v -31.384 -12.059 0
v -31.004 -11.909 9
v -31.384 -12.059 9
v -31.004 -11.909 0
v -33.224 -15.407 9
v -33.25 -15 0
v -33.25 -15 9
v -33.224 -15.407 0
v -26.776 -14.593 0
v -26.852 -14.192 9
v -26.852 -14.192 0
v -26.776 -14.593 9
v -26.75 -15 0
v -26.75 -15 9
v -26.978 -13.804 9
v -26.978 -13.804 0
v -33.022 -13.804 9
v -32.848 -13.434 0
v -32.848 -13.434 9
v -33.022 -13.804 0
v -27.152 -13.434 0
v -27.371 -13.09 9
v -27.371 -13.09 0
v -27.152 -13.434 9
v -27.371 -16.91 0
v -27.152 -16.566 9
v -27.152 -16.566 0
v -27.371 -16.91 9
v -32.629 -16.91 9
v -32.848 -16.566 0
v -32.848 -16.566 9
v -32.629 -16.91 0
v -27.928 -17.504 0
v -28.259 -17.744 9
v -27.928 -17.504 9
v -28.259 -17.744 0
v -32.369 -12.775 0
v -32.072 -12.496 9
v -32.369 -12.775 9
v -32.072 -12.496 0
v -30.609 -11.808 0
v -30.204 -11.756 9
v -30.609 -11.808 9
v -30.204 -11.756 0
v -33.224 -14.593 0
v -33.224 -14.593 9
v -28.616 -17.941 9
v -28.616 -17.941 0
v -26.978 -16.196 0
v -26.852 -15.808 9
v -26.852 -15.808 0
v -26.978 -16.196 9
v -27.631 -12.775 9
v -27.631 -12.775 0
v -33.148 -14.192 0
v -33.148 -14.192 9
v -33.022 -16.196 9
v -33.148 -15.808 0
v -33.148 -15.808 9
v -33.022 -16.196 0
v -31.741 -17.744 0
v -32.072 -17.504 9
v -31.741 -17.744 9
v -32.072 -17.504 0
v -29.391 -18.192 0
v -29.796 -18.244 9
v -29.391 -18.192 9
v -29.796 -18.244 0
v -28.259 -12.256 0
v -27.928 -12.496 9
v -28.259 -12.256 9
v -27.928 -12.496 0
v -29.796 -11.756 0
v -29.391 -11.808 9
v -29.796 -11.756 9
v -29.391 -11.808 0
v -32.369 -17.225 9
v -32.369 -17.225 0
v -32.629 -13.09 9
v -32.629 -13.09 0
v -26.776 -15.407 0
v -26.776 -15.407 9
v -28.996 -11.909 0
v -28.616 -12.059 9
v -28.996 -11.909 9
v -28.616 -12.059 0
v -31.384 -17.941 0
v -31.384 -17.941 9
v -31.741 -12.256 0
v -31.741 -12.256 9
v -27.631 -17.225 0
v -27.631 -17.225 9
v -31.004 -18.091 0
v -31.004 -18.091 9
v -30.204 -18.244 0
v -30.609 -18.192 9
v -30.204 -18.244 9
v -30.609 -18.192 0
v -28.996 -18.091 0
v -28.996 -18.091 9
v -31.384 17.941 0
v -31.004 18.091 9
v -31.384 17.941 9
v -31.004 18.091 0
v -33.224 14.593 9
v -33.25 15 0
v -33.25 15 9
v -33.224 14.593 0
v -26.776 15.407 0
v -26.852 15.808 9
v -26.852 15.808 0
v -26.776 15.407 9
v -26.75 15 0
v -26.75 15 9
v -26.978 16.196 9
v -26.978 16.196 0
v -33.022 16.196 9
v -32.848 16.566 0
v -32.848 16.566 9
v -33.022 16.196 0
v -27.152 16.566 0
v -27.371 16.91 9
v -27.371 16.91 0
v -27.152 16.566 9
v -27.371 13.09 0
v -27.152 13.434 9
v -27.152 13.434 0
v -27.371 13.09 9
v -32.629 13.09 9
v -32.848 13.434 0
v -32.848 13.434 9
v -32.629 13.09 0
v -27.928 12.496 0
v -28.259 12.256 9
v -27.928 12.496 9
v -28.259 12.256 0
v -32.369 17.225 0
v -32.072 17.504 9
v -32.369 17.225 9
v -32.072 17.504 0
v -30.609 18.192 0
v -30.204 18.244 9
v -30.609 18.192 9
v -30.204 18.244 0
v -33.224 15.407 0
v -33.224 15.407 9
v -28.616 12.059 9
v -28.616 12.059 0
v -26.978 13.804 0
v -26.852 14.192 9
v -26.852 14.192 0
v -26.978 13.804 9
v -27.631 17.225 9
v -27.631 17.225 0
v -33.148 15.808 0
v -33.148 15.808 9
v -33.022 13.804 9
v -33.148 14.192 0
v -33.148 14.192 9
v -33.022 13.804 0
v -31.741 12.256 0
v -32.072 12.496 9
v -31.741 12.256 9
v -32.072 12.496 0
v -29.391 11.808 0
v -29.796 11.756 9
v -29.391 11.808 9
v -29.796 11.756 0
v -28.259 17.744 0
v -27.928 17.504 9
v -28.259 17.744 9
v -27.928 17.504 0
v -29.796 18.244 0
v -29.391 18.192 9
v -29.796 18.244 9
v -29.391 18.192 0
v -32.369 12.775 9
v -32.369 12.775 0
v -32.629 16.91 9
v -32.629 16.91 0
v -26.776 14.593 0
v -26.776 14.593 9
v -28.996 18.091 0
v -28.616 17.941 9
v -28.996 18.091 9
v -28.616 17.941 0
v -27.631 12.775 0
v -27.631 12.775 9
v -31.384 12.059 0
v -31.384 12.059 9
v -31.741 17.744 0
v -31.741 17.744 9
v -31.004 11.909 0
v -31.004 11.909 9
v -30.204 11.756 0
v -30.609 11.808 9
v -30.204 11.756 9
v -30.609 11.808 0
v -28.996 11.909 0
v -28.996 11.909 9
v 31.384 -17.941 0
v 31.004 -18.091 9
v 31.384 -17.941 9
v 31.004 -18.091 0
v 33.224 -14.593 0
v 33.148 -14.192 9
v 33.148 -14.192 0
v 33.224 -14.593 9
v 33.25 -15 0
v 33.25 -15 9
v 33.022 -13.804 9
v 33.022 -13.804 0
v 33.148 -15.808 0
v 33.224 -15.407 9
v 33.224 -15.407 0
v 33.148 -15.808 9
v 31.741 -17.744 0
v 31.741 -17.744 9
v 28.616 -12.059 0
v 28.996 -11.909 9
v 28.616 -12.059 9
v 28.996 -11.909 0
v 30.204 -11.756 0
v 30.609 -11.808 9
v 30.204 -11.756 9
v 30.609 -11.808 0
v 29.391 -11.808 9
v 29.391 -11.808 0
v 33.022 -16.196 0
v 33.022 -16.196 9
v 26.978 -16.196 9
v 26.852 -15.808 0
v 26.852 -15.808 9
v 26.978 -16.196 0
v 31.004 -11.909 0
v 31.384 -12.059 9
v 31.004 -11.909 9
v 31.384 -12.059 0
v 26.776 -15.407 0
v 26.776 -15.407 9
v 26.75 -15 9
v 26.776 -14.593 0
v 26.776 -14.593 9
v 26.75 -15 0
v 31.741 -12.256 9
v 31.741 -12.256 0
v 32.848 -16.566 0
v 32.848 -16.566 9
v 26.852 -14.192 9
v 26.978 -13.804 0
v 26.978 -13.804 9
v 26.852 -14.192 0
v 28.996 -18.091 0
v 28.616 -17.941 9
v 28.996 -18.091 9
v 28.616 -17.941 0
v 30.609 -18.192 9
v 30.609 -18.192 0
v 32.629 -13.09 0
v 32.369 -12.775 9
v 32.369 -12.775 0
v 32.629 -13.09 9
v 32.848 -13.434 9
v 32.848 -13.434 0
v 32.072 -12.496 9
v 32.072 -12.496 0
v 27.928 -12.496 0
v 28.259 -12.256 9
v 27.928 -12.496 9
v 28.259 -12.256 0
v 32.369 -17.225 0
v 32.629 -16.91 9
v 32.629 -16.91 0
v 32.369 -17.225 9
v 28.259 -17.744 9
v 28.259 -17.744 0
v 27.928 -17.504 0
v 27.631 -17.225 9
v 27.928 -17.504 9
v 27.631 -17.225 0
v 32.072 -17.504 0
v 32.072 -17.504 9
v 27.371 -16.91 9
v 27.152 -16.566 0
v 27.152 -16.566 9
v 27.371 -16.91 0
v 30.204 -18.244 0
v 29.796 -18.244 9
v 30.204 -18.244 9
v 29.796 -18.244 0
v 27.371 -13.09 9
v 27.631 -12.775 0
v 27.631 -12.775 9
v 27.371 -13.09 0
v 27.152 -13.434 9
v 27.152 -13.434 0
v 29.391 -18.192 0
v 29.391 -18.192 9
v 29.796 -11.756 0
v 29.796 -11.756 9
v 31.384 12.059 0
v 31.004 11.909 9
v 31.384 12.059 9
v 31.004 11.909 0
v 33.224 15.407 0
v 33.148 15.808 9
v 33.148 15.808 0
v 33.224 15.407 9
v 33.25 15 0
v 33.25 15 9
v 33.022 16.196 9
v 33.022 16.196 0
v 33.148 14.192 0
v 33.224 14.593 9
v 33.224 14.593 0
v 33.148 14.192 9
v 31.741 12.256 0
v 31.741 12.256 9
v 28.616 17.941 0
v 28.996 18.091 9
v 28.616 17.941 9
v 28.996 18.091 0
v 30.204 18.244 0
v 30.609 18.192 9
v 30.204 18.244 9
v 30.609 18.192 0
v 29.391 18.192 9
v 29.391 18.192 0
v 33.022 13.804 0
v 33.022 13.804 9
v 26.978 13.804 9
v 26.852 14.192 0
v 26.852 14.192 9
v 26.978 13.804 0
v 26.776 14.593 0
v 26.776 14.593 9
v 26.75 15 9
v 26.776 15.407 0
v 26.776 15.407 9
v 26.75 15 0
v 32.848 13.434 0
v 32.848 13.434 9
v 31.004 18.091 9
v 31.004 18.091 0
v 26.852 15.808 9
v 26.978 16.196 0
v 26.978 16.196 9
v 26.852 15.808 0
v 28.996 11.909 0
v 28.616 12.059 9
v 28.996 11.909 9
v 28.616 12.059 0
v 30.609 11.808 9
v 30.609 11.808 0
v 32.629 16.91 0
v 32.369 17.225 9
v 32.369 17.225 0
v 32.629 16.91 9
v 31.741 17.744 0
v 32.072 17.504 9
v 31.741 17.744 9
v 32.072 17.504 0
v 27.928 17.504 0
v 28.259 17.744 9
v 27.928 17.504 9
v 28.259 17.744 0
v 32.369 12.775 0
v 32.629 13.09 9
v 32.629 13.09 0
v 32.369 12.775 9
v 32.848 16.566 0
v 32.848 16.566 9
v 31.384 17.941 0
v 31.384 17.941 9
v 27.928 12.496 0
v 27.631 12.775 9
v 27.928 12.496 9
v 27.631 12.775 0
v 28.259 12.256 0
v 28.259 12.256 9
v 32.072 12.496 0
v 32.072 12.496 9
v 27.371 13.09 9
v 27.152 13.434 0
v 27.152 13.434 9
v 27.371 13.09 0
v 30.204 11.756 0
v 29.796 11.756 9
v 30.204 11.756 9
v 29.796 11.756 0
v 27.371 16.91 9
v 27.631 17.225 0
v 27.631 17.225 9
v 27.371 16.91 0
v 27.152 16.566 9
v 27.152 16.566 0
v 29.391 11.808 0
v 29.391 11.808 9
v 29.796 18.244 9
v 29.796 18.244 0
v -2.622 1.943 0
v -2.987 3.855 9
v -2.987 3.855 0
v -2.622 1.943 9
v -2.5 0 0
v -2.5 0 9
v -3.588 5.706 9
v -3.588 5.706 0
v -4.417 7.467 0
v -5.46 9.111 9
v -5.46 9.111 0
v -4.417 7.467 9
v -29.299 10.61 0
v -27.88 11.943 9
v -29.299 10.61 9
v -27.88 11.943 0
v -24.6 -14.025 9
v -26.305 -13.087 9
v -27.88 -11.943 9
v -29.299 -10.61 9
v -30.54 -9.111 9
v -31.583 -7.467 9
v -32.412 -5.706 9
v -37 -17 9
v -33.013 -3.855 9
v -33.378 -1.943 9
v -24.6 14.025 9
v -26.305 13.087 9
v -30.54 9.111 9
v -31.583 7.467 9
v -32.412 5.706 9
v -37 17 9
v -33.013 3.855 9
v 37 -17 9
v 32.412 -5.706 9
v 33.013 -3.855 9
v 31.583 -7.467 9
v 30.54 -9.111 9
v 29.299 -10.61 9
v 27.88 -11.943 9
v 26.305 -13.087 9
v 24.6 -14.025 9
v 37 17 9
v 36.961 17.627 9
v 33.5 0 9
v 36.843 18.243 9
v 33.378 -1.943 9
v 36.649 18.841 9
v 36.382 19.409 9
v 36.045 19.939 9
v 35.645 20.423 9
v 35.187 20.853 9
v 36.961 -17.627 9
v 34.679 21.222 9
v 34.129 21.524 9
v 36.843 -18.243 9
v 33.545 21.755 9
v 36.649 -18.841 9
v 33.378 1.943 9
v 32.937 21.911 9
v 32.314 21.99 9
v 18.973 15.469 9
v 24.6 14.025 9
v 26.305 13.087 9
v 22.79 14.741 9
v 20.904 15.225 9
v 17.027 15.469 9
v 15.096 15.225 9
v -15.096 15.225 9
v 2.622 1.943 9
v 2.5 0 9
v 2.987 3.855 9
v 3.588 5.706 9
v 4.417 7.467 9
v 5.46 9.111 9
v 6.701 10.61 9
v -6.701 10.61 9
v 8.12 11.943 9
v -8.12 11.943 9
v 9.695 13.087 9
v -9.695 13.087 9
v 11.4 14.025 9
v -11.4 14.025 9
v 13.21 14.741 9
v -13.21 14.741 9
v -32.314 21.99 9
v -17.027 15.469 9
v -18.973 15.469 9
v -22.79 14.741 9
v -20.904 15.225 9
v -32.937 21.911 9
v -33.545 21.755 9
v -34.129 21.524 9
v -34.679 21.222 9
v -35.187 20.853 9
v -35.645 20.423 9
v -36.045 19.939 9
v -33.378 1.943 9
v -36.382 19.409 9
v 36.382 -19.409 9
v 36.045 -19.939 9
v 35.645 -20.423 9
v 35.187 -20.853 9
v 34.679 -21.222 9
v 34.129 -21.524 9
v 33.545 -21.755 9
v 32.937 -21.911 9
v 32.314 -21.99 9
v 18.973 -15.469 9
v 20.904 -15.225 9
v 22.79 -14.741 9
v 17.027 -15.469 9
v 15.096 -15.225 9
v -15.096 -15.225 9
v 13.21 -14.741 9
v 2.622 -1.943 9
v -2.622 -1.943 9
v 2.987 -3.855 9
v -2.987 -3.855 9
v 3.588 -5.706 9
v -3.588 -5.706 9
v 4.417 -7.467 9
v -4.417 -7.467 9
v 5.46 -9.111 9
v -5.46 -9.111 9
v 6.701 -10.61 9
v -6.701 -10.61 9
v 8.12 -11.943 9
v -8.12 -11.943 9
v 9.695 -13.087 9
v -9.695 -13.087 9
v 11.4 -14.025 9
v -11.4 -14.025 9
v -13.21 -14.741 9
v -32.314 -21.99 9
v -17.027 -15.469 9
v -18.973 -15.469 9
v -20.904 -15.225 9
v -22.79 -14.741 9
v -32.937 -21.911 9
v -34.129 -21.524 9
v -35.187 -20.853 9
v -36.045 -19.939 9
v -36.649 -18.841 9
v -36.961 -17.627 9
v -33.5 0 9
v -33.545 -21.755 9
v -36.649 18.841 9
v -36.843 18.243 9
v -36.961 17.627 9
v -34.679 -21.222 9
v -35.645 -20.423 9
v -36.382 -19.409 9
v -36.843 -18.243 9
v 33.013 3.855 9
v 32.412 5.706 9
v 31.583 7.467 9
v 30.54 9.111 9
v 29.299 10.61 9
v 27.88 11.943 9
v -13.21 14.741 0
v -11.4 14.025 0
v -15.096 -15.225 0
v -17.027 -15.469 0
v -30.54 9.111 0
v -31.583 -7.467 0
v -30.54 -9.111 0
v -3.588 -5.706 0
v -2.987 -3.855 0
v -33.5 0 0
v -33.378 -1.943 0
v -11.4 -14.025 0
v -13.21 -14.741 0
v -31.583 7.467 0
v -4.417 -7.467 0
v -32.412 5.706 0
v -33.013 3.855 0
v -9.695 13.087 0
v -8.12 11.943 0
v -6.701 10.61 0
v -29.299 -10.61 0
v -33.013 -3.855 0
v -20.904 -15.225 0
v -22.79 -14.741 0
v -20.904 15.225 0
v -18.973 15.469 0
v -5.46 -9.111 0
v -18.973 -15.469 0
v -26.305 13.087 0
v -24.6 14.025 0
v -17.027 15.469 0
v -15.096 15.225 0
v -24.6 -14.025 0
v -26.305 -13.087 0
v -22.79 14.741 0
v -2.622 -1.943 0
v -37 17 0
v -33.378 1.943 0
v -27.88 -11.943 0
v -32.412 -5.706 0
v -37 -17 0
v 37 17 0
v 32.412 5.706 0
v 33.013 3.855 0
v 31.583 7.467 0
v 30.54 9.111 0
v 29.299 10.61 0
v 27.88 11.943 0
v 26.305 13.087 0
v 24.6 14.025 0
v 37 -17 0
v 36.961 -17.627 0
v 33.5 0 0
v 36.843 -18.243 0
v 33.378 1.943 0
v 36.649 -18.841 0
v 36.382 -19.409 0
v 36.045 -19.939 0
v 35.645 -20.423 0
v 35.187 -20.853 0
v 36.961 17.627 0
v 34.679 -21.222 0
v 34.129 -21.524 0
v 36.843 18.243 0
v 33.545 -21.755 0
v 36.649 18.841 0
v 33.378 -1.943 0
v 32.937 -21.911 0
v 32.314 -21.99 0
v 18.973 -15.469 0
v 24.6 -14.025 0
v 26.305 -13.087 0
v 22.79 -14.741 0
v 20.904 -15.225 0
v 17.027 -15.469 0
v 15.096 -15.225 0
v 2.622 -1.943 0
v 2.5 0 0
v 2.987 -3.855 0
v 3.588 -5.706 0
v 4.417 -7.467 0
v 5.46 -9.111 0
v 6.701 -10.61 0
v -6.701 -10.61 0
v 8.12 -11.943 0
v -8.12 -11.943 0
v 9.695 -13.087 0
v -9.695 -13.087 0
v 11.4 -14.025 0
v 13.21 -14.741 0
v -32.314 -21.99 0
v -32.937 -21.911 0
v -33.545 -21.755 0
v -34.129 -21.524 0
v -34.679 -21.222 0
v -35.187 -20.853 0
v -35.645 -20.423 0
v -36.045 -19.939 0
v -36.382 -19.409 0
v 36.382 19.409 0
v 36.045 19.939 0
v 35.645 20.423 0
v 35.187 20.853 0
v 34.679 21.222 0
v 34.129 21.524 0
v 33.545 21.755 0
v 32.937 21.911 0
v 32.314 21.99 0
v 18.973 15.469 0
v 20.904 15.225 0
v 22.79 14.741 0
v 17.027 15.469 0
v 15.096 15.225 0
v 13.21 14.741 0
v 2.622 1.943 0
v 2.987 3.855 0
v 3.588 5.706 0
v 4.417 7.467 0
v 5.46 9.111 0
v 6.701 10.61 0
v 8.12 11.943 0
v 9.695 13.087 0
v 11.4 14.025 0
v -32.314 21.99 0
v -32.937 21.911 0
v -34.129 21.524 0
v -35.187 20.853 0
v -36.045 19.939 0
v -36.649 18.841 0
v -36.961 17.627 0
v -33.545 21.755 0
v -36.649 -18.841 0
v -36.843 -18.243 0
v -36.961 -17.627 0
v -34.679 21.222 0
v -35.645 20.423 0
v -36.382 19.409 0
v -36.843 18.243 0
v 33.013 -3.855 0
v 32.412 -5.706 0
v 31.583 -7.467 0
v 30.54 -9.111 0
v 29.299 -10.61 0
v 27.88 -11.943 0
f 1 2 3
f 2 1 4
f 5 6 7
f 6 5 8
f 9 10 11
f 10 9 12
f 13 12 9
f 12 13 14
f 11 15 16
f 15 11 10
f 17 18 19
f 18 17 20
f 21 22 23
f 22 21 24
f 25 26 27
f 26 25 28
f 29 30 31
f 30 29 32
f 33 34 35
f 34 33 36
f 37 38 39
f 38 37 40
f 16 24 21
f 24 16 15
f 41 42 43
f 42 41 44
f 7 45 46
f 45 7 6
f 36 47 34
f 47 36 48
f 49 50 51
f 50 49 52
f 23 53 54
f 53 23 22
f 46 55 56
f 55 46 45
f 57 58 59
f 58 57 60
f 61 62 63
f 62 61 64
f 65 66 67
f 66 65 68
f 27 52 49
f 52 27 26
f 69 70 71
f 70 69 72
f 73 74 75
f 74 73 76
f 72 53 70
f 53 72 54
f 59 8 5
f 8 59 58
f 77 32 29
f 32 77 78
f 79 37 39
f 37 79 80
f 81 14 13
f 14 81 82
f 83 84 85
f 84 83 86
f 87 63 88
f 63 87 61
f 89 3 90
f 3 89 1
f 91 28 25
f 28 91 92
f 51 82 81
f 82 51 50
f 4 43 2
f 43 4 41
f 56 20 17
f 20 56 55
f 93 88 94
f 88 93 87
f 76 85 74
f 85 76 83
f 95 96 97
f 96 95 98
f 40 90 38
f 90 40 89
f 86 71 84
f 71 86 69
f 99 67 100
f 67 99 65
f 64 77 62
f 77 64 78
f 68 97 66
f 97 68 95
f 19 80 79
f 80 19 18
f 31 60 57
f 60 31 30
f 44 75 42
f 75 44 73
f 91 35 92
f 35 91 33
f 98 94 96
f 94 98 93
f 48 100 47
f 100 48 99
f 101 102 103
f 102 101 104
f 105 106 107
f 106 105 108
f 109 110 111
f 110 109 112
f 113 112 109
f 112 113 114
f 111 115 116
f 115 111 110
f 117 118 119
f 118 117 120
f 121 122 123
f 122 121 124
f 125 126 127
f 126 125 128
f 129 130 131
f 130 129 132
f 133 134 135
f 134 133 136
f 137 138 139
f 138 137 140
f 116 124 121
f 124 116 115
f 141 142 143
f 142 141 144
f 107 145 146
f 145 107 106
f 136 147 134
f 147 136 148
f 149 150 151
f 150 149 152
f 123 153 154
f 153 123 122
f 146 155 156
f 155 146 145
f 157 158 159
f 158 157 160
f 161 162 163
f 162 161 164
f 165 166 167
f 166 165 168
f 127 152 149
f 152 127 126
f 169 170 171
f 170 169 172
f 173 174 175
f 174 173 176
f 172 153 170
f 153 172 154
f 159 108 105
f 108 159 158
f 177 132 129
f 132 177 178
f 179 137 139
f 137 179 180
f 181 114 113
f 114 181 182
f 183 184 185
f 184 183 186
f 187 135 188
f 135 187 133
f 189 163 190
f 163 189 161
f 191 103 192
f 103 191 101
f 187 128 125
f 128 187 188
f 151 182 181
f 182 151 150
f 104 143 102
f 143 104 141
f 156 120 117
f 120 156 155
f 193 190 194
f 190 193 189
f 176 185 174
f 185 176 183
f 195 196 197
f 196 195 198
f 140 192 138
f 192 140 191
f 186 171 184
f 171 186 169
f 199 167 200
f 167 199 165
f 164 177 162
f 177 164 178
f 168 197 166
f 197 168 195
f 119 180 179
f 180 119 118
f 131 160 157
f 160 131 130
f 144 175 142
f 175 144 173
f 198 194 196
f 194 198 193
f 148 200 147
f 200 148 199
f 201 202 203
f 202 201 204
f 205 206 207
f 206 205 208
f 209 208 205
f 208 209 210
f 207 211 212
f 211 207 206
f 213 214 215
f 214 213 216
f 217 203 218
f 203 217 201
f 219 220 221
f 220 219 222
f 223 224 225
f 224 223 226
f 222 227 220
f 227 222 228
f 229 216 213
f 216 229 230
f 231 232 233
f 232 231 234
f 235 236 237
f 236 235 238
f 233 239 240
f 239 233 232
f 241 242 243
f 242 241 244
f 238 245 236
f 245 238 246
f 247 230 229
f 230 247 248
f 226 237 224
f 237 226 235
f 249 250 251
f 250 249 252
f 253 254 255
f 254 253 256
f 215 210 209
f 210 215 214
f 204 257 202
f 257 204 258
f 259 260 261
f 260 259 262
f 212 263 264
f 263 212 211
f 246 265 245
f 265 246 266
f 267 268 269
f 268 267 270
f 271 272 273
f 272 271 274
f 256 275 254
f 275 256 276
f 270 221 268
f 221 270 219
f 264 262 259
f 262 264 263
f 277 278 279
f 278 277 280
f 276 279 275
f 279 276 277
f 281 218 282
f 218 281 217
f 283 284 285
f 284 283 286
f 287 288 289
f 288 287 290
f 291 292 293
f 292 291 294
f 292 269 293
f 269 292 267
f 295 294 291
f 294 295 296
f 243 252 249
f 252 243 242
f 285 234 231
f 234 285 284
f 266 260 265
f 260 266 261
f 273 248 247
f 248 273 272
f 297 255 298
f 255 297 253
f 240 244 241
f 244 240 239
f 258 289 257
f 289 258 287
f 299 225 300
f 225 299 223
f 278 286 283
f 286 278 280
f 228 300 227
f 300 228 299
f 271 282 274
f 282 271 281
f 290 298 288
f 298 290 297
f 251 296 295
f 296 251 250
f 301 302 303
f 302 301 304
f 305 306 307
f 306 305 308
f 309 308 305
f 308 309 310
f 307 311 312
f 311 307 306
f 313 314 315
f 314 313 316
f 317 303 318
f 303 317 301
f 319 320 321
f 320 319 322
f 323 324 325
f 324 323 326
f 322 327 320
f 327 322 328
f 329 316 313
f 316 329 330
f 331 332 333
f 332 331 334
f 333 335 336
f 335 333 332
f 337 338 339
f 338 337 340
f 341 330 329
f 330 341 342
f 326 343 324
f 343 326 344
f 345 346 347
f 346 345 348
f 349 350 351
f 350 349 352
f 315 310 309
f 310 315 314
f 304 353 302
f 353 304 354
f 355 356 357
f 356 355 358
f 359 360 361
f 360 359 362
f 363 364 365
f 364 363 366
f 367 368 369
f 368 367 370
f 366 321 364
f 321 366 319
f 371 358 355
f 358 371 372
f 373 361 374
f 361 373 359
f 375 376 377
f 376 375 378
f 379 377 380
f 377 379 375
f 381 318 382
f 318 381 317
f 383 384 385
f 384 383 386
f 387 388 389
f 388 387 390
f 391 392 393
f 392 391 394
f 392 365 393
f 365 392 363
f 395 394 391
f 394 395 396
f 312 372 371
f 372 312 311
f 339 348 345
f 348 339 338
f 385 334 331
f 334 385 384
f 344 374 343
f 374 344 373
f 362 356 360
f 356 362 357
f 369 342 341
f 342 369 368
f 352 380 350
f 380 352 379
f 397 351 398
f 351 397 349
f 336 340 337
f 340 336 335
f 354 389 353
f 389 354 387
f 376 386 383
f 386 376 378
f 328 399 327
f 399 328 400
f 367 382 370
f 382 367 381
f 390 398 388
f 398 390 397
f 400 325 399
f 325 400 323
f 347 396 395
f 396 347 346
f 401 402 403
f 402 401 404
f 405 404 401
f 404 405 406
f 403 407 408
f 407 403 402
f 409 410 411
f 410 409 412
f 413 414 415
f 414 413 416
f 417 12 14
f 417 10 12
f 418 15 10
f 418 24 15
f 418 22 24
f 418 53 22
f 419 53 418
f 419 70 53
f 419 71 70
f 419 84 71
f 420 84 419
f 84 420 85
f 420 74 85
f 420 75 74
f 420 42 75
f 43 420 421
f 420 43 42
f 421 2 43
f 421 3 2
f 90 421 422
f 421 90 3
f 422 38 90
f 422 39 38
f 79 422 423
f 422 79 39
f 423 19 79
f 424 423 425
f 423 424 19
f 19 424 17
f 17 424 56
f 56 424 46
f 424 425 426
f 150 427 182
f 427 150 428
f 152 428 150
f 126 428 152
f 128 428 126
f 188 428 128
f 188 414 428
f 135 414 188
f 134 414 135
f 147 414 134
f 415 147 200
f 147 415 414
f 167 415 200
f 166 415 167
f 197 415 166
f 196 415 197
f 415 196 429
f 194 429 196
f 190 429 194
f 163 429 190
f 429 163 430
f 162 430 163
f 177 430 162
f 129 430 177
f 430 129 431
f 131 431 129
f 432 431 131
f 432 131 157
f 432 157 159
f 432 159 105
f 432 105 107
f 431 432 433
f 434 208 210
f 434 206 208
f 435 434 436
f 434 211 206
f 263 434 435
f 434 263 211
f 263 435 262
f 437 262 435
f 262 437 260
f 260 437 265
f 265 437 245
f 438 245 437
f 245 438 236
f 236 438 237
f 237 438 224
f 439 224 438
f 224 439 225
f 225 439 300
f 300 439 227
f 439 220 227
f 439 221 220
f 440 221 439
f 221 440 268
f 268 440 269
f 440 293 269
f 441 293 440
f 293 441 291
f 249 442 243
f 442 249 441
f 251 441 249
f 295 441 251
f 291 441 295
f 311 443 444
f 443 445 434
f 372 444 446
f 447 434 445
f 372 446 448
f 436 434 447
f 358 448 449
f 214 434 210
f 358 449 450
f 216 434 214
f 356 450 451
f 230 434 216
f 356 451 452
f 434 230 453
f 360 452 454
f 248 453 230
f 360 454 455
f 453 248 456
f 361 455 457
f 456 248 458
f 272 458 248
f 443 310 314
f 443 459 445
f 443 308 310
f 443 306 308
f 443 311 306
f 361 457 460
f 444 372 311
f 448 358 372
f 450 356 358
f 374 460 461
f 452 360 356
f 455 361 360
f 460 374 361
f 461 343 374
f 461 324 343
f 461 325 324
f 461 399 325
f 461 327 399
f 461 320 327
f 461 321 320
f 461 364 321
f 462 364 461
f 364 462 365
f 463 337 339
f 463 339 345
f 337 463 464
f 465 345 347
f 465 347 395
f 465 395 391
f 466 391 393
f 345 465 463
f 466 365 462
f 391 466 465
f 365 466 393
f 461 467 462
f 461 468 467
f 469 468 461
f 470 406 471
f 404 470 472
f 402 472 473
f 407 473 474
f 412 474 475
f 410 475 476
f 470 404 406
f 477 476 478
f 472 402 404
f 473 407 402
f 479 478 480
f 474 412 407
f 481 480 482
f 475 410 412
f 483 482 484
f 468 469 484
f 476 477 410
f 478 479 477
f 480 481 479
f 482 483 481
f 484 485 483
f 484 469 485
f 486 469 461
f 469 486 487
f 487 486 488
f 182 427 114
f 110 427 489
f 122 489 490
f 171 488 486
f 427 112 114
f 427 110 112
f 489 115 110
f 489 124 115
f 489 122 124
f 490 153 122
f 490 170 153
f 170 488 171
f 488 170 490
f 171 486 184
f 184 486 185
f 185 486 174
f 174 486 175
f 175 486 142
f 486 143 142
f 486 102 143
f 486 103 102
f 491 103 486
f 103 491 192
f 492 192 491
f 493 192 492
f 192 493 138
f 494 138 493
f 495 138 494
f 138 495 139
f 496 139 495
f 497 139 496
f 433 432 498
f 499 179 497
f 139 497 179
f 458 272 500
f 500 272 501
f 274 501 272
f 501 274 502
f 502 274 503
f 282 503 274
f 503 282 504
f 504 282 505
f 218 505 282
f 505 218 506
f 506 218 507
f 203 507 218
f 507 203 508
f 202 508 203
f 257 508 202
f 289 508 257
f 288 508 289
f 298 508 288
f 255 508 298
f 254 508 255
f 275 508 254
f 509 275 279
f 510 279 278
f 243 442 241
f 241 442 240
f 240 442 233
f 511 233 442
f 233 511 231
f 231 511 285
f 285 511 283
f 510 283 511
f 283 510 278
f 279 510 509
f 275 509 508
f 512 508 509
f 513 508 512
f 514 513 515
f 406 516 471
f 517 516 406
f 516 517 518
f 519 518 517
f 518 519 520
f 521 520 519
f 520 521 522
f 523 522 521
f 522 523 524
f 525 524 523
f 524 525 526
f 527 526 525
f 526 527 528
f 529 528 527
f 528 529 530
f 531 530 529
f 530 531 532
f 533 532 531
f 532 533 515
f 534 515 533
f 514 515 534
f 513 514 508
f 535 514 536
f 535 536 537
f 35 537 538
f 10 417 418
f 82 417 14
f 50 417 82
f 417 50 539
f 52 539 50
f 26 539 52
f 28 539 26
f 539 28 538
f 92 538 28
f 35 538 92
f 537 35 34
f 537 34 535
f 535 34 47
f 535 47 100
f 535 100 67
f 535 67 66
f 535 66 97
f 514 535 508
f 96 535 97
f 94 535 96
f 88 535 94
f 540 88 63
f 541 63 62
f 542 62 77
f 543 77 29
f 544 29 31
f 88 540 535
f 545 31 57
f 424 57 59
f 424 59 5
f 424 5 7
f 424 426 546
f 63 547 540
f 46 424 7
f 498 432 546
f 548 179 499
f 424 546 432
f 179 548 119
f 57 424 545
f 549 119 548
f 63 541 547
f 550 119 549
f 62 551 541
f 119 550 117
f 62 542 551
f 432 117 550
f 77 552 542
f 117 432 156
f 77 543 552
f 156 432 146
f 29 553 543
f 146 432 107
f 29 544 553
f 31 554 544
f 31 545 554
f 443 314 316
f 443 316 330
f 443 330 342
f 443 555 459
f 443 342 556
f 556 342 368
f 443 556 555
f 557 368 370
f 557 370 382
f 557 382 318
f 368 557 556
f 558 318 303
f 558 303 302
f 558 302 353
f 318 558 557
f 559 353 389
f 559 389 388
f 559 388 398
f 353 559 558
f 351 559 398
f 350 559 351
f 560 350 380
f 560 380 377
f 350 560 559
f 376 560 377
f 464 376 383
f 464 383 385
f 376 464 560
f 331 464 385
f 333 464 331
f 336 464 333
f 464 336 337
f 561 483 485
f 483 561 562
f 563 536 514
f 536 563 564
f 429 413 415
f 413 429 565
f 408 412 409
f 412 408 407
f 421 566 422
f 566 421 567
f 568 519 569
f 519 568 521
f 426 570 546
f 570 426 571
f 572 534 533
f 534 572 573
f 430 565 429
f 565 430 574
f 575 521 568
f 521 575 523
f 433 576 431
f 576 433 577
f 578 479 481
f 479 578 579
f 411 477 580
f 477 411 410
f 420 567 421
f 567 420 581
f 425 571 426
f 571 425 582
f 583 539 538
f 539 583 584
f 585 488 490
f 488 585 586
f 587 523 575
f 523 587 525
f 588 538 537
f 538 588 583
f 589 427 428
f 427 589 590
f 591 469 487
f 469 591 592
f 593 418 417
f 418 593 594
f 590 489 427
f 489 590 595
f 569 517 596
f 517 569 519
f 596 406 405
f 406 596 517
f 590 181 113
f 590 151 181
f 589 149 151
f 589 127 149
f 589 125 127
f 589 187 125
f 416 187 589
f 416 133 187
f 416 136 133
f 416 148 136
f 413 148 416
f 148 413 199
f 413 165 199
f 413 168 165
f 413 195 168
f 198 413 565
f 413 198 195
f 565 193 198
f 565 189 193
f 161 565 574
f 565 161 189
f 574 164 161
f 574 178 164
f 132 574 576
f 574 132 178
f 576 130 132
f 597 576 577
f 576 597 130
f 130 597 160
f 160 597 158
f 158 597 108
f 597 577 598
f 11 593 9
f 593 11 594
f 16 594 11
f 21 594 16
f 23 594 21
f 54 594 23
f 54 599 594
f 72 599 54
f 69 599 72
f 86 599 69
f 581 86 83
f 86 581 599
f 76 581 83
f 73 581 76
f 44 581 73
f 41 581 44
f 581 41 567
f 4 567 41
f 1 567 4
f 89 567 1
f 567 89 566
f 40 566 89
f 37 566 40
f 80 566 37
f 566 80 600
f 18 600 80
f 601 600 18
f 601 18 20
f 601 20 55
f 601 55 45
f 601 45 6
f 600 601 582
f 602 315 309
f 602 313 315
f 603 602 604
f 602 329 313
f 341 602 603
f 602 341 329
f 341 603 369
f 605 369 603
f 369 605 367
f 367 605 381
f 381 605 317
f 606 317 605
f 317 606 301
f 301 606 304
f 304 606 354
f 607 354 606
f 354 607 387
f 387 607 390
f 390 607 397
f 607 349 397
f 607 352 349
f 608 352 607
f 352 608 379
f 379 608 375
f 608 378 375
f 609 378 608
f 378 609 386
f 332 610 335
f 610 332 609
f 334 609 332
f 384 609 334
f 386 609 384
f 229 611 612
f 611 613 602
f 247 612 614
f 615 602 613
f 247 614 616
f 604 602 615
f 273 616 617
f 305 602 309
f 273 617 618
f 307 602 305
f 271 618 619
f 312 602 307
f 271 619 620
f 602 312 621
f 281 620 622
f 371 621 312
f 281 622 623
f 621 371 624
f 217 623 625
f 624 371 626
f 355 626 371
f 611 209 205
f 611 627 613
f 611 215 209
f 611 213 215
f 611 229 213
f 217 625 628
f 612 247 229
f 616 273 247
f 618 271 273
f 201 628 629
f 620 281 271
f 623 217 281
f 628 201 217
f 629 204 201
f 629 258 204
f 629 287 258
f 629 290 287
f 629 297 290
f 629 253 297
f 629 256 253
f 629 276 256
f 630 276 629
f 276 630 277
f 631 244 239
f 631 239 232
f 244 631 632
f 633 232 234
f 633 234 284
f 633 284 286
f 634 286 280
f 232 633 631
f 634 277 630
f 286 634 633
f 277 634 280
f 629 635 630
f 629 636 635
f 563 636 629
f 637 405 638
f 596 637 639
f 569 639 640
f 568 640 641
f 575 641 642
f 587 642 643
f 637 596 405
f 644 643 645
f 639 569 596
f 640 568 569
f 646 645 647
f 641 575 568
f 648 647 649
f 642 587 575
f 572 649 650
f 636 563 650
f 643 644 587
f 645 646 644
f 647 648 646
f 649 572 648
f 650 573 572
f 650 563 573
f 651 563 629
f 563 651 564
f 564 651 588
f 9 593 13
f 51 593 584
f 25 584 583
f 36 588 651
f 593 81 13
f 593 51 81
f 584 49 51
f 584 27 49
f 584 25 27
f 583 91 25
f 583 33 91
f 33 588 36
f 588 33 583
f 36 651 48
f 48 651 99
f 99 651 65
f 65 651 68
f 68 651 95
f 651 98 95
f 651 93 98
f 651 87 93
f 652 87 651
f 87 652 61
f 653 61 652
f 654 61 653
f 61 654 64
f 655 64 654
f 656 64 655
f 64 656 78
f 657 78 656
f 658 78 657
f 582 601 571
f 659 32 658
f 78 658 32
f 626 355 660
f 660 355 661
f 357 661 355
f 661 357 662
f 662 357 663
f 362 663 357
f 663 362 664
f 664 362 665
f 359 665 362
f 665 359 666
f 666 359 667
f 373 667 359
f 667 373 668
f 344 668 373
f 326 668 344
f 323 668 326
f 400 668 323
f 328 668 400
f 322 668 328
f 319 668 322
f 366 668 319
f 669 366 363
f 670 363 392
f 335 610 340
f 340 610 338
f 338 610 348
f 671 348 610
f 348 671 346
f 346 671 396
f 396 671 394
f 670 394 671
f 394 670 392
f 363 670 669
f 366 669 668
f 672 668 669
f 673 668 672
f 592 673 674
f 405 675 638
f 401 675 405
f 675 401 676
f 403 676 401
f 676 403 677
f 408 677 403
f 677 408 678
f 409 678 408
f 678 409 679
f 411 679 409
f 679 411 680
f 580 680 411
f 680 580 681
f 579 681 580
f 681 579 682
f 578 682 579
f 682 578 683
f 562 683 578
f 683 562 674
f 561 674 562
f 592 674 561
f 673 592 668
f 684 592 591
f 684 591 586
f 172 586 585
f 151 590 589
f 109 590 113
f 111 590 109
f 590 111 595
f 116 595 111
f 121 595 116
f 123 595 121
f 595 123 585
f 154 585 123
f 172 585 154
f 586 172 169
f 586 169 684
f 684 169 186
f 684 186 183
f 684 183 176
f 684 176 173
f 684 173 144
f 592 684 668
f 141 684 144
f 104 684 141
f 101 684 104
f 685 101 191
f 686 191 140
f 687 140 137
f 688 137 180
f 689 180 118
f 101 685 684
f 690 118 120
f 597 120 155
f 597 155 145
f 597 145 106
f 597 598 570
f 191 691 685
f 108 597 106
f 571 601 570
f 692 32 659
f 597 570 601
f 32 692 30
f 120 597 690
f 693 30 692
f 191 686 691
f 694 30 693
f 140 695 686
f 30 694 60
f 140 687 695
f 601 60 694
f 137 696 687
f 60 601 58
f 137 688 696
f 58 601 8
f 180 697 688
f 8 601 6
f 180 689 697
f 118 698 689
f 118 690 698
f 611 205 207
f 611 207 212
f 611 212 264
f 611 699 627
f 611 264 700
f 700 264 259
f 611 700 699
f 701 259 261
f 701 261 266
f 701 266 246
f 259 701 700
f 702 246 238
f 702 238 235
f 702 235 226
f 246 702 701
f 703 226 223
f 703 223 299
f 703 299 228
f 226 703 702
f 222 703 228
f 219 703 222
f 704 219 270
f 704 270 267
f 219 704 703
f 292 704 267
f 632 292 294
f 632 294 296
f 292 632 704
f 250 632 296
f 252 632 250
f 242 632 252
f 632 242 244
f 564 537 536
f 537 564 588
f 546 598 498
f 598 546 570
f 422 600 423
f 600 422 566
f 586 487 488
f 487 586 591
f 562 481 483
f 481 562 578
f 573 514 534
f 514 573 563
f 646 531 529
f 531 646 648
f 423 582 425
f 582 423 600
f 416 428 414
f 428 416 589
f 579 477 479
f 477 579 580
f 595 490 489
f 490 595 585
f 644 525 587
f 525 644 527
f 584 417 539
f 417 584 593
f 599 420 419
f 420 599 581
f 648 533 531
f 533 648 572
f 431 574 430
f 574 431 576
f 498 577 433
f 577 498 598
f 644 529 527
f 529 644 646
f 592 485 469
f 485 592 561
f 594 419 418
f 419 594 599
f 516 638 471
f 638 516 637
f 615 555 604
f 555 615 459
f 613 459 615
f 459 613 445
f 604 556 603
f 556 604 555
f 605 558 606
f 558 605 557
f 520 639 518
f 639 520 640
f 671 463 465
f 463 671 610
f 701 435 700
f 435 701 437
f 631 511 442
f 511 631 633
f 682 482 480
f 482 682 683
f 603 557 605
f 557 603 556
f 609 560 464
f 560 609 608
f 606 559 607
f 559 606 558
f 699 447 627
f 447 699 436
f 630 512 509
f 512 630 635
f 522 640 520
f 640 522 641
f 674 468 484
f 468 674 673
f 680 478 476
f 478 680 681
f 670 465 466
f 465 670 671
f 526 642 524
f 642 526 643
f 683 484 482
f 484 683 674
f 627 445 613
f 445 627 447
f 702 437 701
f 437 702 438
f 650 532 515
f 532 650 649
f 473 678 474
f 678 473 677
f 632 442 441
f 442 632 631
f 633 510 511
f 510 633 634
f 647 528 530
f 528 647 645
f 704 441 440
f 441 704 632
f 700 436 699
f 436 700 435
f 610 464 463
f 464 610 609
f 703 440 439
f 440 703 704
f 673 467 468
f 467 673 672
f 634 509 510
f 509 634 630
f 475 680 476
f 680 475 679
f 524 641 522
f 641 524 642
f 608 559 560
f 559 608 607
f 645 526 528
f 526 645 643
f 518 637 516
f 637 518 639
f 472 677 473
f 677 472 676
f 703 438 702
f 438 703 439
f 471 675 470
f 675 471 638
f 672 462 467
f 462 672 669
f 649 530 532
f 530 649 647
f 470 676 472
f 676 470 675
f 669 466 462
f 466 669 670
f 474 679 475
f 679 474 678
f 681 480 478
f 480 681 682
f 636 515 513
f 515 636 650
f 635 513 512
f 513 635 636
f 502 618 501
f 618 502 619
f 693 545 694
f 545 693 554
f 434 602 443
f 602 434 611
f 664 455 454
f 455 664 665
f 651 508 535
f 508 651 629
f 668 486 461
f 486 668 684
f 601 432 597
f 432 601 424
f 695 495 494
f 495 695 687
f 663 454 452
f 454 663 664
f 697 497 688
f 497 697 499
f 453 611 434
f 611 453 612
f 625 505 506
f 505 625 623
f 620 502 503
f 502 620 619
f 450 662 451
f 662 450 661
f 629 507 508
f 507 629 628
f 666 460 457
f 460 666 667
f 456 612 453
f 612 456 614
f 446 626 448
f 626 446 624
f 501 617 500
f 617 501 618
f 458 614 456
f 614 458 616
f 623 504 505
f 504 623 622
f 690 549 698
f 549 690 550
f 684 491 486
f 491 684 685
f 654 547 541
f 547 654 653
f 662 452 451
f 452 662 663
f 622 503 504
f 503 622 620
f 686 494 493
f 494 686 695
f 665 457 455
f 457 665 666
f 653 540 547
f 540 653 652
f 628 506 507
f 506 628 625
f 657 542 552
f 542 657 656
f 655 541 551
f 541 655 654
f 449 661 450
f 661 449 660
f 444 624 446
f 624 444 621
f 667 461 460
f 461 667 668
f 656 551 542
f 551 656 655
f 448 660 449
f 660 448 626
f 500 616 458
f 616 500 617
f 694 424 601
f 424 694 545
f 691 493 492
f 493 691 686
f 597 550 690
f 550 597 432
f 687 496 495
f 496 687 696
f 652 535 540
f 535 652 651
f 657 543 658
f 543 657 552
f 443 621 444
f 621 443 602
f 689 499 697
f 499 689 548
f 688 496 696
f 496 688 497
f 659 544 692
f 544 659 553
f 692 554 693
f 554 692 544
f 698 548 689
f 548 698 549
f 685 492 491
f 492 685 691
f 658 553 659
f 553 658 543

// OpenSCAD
$fn = 50;


difference() {
	union() {
		hull() {
			translate(v = [-32.0000000000, 17.0000000000, 0]) {
				cylinder(h = 9, r = 5);
			}
			translate(v = [32.0000000000, 17.0000000000, 0]) {
				cylinder(h = 9, r = 5);
			}
			translate(v = [-32.0000000000, -17.0000000000, 0]) {
				cylinder(h = 9, r = 5);
			}
			translate(v = [32.0000000000, -17.0000000000, 0]) {
				cylinder(h = 9, r = 5);
			}
		}
	}
	union() {
		#translate(v = [-30.0000000000, -15.0000000000, -100.0000000000]) {
			cylinder(h = 200, r = 3.2500000000);
		}
		#translate(v = [-30.0000000000, 15.0000000000, -100.0000000000]) {
			cylinder(h = 200, r = 3.2500000000);
		}
		#translate(v = [30.0000000000, -15.0000000000, -100.0000000000]) {
			cylinder(h = 200, r = 3.2500000000);
		}
		#translate(v = [30.0000000000, 15.0000000000, -100.0000000000]) {
			cylinder(h = 200, r = 3.2500000000);
		}
		#translate(v = [-18.0000000000, 0, 0]) {
			cylinder(h = 9, r = 15.5000000000);
		}
		#translate(v = [18.0000000000, 0, 0]) {
			cylinder(h = 9, r = 15.5000000000);
		}
	}
}
